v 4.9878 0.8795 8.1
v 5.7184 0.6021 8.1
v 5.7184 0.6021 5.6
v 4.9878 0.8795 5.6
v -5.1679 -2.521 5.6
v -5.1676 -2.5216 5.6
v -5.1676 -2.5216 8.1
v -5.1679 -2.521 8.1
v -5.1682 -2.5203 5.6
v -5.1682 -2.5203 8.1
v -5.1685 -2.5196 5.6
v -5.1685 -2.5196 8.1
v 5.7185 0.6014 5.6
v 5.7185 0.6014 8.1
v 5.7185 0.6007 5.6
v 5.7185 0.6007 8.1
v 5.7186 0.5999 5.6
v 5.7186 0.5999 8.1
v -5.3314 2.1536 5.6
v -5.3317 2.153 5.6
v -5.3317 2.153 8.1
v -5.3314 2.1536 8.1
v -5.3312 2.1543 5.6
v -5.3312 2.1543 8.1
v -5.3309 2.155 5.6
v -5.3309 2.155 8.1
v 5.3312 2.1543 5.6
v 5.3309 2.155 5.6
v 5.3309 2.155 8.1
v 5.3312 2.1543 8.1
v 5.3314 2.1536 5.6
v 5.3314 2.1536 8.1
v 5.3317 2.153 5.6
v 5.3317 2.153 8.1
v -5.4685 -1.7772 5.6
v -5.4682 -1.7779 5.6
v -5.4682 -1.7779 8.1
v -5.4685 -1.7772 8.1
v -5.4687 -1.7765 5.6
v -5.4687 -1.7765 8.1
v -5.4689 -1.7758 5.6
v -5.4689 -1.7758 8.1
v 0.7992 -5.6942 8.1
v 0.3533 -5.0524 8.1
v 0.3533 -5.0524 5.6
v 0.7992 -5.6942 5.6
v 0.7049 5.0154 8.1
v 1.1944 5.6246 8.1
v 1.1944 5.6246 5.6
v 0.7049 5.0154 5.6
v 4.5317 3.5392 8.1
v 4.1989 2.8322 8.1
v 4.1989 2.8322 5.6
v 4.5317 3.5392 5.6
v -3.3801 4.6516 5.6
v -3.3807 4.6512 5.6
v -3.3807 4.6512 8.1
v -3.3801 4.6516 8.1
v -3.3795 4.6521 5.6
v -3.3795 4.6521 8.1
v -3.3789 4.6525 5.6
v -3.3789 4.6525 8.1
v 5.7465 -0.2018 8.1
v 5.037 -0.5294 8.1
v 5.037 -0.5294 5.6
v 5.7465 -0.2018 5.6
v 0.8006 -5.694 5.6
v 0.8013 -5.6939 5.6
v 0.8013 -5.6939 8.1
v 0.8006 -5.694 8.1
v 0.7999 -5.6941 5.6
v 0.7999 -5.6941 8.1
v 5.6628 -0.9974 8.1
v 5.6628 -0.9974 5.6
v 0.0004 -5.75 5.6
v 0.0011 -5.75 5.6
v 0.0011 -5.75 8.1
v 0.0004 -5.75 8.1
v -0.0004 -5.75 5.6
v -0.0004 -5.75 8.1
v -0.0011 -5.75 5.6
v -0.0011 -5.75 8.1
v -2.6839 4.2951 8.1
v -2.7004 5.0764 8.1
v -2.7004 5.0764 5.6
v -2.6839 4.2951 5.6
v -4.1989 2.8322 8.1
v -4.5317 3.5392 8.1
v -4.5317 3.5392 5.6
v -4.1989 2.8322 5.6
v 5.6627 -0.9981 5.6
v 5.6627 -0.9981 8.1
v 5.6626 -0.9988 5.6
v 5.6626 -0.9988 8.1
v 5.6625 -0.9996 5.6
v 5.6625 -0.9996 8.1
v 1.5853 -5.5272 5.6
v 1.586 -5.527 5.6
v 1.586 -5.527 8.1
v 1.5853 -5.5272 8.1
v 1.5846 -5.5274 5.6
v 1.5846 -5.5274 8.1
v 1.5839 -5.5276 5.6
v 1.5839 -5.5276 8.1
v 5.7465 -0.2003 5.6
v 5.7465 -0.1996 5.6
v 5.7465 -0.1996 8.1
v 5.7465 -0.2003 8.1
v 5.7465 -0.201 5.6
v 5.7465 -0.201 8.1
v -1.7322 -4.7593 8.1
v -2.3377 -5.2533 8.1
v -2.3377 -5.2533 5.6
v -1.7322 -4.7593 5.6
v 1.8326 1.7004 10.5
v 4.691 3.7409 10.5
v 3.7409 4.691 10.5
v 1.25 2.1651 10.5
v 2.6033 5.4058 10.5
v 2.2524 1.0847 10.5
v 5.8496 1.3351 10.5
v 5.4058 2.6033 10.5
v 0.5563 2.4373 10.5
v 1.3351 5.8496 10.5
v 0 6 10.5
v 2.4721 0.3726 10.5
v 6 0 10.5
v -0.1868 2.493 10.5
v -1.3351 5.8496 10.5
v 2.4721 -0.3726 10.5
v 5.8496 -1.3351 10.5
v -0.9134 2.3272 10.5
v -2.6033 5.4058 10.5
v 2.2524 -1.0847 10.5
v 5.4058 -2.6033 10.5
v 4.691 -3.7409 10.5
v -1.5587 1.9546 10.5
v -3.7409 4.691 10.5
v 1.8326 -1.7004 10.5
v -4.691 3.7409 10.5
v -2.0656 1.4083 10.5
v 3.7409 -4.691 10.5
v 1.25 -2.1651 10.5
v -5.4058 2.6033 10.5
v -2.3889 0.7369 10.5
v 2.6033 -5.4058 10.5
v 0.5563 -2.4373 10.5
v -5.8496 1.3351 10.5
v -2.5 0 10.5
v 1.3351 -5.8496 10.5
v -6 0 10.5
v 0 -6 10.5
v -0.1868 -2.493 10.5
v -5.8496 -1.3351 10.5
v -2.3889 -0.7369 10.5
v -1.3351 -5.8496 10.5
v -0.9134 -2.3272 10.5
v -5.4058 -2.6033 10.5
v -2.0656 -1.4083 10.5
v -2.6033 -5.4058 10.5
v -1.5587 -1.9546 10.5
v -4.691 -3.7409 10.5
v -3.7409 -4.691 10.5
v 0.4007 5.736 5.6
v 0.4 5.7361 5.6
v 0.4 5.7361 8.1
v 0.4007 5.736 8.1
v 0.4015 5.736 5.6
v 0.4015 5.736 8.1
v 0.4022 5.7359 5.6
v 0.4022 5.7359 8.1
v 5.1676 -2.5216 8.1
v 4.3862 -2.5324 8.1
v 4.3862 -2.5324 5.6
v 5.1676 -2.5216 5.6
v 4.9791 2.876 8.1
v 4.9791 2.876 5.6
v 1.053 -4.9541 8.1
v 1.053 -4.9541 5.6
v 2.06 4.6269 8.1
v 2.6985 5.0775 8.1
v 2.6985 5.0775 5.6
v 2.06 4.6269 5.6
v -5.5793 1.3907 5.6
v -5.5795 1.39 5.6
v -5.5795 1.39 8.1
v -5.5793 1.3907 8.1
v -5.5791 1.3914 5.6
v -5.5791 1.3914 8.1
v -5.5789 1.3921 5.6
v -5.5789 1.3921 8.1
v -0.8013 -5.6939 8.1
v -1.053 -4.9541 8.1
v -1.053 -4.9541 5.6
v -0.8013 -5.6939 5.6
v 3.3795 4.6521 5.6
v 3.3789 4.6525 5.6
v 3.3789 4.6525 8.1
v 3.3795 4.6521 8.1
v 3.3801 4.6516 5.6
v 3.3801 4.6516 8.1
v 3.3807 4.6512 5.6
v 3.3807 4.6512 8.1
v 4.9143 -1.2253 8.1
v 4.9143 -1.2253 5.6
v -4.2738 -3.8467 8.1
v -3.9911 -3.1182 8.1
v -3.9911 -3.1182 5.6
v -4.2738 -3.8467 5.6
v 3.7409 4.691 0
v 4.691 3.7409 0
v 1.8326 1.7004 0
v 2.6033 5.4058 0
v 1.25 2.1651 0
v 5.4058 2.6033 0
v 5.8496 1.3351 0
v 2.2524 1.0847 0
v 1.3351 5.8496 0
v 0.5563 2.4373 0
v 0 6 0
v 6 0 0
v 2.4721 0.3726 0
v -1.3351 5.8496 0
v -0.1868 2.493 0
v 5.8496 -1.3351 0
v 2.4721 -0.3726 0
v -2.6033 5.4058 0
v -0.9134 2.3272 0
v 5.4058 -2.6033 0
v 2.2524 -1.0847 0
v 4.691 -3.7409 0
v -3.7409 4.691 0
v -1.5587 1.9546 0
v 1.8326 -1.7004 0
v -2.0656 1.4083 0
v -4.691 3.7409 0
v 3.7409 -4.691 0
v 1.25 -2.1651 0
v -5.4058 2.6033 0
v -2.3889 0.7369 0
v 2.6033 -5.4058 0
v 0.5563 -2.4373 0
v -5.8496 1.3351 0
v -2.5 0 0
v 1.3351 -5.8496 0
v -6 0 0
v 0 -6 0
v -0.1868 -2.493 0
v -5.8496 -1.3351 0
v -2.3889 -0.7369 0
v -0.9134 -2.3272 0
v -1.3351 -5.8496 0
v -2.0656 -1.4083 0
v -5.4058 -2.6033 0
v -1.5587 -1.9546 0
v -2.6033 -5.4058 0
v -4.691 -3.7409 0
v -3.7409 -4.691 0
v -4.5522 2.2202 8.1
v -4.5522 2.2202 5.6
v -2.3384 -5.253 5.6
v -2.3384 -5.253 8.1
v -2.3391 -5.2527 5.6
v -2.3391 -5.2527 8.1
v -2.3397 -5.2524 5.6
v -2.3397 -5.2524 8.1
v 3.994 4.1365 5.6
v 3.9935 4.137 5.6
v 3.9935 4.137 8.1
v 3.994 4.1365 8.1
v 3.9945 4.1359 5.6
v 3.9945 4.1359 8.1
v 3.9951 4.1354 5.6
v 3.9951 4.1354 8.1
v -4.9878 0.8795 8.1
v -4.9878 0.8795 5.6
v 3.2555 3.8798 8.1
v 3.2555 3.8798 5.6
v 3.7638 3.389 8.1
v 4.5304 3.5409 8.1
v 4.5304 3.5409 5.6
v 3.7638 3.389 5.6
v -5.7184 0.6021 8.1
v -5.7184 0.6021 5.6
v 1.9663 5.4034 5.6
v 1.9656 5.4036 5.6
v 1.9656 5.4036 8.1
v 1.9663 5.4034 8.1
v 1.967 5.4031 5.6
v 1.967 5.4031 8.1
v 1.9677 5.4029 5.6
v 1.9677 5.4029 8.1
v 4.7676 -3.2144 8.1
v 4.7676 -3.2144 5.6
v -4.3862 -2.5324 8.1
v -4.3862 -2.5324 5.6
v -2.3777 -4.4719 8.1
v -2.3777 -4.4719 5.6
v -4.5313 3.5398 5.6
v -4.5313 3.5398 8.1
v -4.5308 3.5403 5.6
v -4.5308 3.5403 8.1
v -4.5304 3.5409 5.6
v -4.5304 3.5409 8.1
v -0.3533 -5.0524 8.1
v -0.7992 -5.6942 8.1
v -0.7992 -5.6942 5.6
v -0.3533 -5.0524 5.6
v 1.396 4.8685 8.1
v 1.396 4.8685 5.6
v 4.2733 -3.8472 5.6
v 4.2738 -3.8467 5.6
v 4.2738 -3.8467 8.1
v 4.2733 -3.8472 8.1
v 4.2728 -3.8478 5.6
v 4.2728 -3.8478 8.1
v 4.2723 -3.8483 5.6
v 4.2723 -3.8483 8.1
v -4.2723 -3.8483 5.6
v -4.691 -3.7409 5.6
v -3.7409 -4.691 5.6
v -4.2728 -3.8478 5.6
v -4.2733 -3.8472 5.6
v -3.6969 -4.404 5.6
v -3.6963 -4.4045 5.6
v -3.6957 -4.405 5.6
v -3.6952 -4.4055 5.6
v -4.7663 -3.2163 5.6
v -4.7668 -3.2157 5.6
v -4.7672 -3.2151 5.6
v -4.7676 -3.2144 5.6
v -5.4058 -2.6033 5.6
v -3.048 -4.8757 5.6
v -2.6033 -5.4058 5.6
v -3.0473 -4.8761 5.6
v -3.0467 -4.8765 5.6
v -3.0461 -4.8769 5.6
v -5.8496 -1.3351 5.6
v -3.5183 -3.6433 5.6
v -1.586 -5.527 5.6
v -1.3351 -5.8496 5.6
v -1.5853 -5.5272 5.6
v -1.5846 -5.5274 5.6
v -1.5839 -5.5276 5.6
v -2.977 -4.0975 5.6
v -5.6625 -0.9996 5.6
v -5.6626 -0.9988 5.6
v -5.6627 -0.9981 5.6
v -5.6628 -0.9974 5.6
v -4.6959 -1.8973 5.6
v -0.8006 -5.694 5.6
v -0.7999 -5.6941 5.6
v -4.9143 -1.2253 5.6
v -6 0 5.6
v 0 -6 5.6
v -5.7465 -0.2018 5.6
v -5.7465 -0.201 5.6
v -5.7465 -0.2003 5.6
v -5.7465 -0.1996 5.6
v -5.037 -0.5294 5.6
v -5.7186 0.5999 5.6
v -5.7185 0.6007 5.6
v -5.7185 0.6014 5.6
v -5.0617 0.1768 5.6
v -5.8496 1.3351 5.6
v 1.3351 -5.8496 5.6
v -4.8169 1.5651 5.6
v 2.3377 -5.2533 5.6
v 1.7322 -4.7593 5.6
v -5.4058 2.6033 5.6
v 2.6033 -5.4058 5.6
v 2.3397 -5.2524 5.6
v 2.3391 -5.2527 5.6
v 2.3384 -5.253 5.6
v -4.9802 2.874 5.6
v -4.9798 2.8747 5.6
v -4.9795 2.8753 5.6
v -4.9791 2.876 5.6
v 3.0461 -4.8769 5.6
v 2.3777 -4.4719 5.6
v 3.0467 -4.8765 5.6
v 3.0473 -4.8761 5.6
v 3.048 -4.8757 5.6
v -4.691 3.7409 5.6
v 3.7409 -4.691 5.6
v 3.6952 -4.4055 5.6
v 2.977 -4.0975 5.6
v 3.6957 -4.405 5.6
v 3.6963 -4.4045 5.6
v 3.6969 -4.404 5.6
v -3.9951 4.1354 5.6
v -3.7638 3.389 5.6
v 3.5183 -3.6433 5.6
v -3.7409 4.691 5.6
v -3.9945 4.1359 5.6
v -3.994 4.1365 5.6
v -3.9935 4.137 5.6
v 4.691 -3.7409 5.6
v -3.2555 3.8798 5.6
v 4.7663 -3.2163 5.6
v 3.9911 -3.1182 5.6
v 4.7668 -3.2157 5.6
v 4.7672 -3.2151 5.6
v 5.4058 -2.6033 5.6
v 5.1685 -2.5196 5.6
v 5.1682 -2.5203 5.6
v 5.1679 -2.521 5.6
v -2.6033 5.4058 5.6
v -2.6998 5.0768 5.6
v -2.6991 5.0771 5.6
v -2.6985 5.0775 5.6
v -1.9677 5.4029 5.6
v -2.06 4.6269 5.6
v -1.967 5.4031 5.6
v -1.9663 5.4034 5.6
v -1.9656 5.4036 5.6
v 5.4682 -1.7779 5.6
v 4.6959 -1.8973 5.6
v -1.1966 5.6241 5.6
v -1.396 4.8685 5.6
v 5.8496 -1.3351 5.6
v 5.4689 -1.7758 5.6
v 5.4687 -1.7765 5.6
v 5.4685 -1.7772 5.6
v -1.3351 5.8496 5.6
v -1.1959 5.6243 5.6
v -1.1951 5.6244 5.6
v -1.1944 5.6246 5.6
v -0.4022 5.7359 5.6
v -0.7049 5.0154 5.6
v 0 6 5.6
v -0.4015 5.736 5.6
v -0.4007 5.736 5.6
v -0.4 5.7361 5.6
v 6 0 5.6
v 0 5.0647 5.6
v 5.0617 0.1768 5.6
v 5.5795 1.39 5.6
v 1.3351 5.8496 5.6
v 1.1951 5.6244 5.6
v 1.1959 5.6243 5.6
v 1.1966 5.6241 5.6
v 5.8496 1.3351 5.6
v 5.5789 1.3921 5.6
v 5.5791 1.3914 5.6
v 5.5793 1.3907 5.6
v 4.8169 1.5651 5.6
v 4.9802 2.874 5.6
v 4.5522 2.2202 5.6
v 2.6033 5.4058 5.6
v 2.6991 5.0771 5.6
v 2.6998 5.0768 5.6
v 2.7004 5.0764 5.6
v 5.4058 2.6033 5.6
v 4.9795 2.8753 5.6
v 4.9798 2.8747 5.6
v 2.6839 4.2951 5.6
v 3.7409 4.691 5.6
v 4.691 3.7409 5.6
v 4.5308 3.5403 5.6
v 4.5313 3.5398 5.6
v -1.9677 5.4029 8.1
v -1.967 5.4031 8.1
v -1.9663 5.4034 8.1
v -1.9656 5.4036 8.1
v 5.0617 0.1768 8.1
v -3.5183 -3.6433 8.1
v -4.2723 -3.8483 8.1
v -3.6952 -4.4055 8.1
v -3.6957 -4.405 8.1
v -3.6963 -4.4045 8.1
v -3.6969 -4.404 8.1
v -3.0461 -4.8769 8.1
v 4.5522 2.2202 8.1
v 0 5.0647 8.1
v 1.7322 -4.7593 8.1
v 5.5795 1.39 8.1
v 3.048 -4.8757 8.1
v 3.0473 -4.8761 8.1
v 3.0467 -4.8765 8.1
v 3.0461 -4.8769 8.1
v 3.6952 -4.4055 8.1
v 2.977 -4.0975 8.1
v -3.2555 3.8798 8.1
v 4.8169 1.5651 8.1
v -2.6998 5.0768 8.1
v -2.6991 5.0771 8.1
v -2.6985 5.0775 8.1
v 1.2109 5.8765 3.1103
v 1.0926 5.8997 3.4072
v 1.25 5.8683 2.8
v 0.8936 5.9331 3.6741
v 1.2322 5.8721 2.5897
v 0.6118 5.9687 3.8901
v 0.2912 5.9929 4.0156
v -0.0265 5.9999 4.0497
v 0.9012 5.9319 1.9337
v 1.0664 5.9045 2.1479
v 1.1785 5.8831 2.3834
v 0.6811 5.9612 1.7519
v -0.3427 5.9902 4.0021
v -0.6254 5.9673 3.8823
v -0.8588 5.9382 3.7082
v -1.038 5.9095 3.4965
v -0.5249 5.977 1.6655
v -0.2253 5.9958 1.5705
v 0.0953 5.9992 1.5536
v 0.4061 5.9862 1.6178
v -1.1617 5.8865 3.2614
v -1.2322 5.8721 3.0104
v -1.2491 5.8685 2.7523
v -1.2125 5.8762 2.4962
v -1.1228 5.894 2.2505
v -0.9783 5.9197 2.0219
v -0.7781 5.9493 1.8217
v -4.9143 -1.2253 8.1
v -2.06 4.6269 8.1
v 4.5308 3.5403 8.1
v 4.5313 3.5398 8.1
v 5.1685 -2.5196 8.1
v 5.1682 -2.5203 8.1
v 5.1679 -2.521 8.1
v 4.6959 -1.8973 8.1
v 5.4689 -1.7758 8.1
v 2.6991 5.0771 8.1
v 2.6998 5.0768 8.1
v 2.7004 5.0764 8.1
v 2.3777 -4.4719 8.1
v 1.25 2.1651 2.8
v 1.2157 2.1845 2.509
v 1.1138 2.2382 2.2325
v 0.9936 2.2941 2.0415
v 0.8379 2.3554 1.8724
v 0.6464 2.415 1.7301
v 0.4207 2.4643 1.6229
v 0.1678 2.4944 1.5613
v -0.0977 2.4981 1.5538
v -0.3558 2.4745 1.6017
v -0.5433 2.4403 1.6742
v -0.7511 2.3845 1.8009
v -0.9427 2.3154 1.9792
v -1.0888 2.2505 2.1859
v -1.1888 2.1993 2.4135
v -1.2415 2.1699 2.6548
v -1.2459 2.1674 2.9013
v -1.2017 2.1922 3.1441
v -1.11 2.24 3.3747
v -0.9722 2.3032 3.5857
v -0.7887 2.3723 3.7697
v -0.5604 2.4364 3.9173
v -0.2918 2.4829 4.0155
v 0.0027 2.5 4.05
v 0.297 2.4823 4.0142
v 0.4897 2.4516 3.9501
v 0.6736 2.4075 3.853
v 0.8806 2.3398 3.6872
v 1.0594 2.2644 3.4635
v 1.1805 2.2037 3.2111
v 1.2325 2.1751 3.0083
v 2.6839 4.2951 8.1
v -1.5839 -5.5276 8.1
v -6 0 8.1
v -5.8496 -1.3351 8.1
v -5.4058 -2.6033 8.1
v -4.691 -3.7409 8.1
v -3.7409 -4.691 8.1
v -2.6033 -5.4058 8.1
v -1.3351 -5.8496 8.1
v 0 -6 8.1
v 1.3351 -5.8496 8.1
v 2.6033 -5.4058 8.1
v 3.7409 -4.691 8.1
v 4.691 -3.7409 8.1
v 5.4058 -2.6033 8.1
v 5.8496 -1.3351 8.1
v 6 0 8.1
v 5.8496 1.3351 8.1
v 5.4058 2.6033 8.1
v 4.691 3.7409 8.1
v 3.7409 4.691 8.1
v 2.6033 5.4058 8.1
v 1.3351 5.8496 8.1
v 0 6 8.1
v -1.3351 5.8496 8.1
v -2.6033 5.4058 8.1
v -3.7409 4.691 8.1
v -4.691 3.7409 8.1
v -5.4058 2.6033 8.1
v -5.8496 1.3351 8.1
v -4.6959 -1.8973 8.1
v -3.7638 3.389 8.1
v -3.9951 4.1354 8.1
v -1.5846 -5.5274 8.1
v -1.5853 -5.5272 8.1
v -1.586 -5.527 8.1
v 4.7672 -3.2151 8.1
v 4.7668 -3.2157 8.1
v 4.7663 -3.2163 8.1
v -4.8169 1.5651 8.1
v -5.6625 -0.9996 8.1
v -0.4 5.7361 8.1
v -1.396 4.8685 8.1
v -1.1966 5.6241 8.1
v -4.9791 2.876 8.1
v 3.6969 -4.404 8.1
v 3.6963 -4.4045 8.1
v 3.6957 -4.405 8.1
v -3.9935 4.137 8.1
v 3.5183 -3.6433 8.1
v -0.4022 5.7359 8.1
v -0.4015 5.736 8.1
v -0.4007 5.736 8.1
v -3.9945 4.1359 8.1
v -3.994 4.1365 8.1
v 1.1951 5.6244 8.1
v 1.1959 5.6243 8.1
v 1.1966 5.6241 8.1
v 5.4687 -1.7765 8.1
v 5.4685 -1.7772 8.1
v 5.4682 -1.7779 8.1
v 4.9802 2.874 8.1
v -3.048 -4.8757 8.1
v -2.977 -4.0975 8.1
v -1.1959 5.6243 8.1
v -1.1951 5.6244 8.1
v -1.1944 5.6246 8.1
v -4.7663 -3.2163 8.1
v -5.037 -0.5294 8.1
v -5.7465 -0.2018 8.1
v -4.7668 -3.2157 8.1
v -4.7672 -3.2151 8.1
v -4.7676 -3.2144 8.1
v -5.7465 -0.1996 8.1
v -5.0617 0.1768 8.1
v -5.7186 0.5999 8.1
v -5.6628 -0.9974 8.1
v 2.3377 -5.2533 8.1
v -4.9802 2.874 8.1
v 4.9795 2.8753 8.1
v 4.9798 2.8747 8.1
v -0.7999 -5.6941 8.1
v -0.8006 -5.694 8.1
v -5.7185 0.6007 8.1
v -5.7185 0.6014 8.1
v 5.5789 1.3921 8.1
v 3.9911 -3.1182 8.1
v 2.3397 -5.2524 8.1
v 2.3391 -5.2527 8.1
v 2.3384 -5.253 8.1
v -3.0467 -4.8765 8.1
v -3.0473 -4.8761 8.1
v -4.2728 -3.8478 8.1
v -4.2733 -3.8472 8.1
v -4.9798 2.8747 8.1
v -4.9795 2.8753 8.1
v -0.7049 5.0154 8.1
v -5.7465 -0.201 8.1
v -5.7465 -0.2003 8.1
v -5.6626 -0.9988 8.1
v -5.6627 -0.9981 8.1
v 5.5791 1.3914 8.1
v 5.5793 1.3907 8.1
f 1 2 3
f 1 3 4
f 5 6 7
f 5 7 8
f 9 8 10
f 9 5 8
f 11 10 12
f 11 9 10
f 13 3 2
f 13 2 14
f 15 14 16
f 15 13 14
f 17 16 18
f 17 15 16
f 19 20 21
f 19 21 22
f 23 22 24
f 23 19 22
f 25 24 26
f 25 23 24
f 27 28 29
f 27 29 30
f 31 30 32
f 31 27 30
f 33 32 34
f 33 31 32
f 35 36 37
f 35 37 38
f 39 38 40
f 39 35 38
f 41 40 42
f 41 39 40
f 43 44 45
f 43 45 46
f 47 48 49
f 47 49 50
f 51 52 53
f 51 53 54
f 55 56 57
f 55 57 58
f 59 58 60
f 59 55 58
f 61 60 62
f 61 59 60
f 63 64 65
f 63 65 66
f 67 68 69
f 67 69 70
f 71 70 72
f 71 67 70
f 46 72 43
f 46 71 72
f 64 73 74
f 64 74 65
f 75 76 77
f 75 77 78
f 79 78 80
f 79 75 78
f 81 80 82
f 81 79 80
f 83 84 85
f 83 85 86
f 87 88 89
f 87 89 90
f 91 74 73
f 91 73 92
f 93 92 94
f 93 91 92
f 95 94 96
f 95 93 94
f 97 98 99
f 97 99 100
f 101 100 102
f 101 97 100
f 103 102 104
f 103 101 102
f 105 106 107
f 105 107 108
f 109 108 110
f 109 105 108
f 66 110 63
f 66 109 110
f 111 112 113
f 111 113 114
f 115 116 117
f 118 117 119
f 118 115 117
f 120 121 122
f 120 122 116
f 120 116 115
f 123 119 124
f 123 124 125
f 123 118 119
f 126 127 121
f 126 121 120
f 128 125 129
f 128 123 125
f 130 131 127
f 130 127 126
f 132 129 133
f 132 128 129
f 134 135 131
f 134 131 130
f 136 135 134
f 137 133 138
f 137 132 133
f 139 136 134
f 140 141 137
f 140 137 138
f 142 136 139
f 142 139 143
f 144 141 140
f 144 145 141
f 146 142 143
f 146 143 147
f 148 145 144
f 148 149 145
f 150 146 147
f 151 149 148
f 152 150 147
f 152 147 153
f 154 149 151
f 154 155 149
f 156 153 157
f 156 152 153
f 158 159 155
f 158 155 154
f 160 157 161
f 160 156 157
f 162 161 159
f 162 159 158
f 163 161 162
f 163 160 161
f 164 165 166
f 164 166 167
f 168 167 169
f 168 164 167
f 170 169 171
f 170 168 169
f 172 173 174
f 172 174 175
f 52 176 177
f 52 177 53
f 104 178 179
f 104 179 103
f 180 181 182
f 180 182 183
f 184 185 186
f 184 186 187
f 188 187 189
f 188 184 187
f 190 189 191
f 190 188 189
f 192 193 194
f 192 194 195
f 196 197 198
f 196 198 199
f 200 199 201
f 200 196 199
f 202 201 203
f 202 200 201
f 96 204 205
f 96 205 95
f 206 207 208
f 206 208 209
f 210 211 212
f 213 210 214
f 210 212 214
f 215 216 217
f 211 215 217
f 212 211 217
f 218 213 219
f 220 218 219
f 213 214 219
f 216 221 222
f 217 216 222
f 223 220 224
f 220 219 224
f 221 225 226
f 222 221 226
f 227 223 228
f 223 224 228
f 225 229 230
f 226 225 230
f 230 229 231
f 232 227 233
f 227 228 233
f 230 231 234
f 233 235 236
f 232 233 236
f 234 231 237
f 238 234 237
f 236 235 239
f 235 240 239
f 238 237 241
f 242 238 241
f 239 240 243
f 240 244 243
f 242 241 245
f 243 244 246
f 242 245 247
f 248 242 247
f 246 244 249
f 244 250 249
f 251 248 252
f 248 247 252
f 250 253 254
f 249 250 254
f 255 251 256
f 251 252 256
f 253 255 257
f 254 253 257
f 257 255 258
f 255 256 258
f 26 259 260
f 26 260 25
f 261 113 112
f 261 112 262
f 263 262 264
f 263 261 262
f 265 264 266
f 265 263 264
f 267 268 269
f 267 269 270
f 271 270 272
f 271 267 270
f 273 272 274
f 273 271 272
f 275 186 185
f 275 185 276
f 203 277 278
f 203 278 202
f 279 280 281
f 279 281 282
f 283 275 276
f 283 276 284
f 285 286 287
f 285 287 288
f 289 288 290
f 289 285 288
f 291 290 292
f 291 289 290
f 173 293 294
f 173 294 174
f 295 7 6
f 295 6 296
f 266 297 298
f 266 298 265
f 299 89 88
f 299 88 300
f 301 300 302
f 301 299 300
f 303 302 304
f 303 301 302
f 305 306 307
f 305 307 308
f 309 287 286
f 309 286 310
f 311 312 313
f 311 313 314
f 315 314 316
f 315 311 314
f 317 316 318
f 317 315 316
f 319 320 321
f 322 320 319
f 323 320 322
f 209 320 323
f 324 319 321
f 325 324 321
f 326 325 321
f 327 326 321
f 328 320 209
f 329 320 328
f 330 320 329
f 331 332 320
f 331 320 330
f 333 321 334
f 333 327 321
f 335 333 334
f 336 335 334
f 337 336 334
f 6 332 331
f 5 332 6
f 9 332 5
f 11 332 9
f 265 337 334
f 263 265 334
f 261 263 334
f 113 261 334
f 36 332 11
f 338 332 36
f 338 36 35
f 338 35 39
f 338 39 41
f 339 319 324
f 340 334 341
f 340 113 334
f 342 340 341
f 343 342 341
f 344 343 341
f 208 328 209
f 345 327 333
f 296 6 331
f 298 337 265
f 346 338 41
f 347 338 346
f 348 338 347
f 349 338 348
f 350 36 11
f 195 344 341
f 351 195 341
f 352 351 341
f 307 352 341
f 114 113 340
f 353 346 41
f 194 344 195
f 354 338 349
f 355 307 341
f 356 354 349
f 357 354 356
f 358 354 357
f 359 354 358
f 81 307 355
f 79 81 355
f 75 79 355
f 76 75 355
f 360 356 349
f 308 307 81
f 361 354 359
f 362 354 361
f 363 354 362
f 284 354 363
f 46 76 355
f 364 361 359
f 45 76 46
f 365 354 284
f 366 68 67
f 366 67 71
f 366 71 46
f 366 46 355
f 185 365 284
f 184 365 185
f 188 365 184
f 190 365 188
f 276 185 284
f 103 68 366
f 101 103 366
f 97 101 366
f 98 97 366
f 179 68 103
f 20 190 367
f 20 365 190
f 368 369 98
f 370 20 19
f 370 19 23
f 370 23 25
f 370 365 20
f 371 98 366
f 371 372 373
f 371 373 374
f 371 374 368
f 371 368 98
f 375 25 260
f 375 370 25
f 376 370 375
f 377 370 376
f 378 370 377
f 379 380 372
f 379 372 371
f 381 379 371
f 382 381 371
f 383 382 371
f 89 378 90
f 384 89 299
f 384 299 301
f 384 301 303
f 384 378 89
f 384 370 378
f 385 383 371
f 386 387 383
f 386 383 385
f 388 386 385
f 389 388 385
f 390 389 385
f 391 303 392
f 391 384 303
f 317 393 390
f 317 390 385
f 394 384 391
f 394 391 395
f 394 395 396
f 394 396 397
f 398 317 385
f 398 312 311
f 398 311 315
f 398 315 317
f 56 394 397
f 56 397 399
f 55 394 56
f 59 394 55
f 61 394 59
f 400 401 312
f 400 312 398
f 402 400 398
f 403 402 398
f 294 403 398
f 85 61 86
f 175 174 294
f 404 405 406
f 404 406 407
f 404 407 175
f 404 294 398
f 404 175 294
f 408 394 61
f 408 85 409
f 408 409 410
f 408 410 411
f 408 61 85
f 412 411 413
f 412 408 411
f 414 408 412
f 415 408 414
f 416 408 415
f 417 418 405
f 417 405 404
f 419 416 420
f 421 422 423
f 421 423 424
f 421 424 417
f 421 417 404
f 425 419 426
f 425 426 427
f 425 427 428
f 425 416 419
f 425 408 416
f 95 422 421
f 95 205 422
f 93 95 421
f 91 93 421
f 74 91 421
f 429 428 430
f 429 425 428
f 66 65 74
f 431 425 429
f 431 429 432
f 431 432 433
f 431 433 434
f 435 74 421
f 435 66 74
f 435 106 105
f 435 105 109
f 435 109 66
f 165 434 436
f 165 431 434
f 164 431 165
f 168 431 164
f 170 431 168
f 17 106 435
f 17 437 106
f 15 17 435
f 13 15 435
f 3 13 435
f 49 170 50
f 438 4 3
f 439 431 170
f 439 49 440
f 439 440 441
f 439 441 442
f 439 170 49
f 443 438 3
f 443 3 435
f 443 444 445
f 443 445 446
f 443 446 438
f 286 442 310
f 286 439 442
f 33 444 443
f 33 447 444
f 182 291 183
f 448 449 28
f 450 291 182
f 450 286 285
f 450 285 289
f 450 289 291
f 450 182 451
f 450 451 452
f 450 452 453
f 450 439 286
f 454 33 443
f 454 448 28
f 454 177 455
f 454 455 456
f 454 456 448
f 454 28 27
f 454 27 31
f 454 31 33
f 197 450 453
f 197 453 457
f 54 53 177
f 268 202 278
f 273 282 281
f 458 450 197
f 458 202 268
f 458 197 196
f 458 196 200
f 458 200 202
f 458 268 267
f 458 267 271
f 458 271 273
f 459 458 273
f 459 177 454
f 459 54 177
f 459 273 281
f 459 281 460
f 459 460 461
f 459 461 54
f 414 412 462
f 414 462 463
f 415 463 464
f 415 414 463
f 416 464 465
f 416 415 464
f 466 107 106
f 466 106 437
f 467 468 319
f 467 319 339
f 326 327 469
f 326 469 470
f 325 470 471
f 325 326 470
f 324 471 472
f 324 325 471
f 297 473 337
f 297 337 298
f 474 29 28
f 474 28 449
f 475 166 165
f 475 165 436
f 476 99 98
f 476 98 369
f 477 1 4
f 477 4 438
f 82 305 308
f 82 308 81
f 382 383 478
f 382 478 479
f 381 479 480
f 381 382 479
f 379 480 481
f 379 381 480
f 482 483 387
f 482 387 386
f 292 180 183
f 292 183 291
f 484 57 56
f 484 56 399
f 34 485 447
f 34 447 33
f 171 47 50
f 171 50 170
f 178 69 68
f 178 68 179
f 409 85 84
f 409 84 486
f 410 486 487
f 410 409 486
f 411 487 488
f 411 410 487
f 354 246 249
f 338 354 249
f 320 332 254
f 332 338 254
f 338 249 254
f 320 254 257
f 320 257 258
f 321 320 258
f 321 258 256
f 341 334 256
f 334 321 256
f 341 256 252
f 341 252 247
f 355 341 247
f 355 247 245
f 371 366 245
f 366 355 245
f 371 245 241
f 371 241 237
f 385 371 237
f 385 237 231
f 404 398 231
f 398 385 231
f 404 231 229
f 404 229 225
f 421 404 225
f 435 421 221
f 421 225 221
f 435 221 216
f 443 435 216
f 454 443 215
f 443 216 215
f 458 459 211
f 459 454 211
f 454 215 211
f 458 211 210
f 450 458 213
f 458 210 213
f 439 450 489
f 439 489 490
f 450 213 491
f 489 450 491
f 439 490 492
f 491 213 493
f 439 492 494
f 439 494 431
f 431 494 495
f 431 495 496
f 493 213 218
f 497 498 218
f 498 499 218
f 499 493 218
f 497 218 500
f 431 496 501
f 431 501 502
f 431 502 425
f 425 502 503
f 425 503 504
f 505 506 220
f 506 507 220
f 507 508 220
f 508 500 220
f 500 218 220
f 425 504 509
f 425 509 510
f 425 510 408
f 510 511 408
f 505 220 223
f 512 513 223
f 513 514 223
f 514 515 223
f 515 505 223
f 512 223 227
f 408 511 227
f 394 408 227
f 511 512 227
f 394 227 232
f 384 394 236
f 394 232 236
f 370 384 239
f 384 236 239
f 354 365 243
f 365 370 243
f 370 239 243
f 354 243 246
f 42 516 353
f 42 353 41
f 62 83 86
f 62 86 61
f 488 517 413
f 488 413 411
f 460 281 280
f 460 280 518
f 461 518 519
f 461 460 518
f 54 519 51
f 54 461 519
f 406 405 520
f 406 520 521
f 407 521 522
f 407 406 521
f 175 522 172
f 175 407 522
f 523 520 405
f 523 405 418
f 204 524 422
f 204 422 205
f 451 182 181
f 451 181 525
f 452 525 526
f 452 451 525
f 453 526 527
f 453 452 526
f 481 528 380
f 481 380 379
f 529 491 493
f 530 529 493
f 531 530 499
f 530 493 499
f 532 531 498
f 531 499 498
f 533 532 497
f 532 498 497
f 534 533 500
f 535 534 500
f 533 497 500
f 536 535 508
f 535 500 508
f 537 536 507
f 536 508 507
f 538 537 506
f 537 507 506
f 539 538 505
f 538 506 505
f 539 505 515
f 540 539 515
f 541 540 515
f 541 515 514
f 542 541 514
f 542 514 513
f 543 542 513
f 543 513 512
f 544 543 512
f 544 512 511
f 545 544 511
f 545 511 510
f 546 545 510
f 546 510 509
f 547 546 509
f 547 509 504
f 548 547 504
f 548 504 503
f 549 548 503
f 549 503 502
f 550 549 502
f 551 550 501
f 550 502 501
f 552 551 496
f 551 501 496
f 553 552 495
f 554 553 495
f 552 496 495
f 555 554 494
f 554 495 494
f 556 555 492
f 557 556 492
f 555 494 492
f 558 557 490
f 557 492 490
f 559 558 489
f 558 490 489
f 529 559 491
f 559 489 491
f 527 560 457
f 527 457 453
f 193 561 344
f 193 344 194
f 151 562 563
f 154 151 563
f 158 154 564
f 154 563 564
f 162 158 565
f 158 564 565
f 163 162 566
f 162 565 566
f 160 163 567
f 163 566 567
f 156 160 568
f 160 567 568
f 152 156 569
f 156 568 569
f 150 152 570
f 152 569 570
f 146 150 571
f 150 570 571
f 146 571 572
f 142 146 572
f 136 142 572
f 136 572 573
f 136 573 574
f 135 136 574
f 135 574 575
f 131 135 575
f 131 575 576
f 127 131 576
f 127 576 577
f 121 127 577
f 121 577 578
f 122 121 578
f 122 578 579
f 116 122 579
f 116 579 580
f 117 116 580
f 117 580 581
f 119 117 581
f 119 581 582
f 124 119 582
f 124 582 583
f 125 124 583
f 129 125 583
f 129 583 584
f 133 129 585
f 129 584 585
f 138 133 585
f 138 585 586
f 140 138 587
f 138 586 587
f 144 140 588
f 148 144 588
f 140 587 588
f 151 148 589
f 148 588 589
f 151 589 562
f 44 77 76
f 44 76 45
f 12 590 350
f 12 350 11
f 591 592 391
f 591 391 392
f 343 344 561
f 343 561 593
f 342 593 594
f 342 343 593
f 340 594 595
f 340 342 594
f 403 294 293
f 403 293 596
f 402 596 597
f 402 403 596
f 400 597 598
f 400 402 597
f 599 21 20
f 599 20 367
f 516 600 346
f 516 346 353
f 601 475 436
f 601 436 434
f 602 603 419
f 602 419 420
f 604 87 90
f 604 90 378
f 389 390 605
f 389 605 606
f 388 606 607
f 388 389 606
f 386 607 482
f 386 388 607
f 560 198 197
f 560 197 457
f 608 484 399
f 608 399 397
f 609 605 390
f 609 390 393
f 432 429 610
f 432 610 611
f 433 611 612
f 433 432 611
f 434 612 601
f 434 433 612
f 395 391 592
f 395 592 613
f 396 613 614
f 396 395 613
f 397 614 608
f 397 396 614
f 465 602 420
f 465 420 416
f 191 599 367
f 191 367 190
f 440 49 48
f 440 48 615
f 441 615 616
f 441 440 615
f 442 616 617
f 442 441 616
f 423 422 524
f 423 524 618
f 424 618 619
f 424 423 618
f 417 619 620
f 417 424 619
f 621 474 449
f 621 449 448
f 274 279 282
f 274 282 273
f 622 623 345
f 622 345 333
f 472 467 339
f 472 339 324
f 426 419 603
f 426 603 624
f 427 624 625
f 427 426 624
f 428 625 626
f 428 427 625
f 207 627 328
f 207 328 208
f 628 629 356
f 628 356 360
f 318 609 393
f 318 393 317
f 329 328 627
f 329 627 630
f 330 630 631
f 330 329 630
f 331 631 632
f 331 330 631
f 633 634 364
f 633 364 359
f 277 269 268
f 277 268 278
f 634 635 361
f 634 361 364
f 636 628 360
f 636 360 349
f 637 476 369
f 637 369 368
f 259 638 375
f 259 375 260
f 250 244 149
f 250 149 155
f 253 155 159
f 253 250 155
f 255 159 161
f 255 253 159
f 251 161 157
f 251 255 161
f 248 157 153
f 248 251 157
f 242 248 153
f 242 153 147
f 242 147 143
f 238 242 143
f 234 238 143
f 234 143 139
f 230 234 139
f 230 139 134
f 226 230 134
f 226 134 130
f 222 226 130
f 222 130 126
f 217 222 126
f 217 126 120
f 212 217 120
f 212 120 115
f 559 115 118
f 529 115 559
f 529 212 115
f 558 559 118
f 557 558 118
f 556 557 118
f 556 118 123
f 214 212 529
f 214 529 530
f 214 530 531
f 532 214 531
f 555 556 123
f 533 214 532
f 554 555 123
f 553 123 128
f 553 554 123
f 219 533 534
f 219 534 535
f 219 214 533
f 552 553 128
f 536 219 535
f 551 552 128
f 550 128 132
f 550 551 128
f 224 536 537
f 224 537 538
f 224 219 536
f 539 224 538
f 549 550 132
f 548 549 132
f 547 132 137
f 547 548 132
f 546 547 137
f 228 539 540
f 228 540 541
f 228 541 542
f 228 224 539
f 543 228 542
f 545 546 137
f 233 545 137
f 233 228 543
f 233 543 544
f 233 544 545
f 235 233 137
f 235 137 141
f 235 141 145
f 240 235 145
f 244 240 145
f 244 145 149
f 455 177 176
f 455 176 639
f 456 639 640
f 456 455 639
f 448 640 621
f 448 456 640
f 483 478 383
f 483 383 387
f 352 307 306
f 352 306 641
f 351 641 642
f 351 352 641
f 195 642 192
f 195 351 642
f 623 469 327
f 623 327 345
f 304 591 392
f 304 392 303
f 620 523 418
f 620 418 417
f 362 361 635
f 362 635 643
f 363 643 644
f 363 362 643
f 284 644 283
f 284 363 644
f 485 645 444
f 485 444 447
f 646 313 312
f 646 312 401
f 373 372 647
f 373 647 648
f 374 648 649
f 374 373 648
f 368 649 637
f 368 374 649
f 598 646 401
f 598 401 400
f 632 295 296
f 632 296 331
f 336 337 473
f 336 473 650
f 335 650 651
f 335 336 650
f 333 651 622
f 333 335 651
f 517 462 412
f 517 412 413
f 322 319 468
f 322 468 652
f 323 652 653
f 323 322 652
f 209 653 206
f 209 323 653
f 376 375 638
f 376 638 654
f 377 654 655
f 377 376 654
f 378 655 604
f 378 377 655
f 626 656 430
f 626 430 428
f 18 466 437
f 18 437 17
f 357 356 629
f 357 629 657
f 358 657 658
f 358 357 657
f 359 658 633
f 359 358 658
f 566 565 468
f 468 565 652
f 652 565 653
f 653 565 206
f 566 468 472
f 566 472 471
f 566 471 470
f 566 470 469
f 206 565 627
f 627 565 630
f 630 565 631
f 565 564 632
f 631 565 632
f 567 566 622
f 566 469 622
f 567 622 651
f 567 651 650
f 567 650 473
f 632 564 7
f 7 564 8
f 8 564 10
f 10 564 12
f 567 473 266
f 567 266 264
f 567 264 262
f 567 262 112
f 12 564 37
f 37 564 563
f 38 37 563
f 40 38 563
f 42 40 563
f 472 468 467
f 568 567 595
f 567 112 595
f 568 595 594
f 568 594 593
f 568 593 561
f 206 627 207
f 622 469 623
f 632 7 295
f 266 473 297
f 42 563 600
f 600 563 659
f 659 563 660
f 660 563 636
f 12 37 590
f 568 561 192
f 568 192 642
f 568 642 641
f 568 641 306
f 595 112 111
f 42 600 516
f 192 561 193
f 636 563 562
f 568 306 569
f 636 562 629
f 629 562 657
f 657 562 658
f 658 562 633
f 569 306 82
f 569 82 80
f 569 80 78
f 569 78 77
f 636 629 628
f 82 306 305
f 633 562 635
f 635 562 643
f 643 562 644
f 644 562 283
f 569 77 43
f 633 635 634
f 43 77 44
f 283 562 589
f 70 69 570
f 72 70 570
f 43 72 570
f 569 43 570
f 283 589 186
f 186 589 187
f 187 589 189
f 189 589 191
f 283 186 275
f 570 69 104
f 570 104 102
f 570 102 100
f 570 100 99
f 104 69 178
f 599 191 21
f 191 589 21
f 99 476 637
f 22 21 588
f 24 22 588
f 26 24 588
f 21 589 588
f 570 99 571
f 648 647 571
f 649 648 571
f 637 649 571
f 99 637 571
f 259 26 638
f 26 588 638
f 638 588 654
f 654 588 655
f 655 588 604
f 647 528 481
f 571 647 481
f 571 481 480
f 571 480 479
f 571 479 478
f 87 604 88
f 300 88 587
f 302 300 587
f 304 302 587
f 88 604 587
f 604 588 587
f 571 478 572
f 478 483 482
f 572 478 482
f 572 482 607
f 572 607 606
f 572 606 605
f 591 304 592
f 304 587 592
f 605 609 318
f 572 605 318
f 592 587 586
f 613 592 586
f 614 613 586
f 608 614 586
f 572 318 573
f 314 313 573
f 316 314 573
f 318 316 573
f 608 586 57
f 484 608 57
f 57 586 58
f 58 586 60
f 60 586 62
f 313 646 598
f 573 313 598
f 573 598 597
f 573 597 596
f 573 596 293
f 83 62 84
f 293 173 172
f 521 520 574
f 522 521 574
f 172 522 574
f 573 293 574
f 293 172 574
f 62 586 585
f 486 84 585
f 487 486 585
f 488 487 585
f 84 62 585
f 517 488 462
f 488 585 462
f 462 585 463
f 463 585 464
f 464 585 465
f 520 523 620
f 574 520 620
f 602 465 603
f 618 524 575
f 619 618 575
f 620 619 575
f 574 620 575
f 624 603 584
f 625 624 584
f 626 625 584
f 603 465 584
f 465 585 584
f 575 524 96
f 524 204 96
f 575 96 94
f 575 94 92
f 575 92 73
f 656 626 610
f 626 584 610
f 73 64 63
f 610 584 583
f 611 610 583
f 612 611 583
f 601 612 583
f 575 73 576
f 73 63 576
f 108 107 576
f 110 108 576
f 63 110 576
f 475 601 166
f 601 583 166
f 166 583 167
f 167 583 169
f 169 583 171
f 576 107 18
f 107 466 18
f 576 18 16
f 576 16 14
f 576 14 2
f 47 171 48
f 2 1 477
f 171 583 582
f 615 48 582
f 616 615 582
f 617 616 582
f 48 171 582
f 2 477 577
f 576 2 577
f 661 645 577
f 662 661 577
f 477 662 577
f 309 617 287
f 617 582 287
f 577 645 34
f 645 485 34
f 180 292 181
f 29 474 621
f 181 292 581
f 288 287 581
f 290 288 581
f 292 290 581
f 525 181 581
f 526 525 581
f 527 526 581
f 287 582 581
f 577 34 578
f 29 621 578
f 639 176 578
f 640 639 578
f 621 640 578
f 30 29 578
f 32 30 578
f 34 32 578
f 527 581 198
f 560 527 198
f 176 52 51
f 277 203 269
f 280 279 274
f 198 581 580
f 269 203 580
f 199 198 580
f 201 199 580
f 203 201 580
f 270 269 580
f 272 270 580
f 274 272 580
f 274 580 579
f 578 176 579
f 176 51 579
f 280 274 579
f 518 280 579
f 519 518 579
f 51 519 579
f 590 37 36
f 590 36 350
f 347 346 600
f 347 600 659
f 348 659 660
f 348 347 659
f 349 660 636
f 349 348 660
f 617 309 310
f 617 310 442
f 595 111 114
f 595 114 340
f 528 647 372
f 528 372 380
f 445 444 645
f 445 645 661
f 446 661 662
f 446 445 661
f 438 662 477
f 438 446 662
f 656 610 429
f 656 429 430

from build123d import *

# Parameters (mm, degrees)
CROQUIS1_R                                     = 6
CROQUIS1_R_2                                   = 2.5
SALIENTE_EXTRUIR1_DEPTH                        = 10.5
CROQUIS2_W                                     = 0.25
CROQUIS2_H                                     = 2.5
CORTAR_EXTRUIR1_DEPTH                          = 2.5
MATRIZC1_COUNT                                 = 45
PERFORADOR_PARA_ROSCAR_PARA_MACHO_DE_ROS_REACH = 19.037
PERFORADOR_PARA_ROSCAR_PARA_MACHO_DE_2_R       = 1.25


with BuildPart() as part:
    # Croquis1 → Saliente-Extruir1 (new body)
    with BuildSketch(Plane.XY):
        with Locations(Location((0, 0, 0), (0, 0, 180))):
            Circle(CROQUIS1_R)
        with Locations(Location((0, 0, 0), (0, 0, 180))):
            Circle(CROQUIS1_R_2, mode=Mode.SUBTRACT)
    extrude(amount=SALIENTE_EXTRUIR1_DEPTH)

    # Croquis2 → Cortar-Revolución1 (revolve, cut)
    with BuildSketch(Plane(origin=(0, 0, 0), x_dir=(1, 0, 0), z_dir=(0, 1, 0)), mode=Mode.PRIVATE) as cortar_revoluci_n1_sk:
        with Locations((5.875, -6.85)):
            Rectangle(CROQUIS2_W, CROQUIS2_H)
    revolve(cortar_revoluci_n1_sk.sketch.rotate(Axis((0, 0, 10.5), (0, 0, -1)), 180), axis=Axis((0, 0, 10.5), (0, 0, -1)), mode=Mode.SUBTRACT)

    # Croquis3 → Cortar-Extruir1 (cut)
    with BuildSketch(Plane(origin=(0, 0, 8.1), x_dir=(-1, 0, 0), z_dir=(0, 0, -1))):
        with BuildLine():
            Line((-0.4, 5.736070083), (0, 5.064736343))
            Line((0, 5.064736343), (0.4, 5.736070083))
            ThreePointArc((0.4, 5.736070083), (0, 5.75), (-0.4, 5.736070083))
        make_face()
    cortar_extruir1 = extrude(amount=CORTAR_EXTRUIR1_DEPTH, mode=Mode.SUBTRACT)

    # MatrizC1: Cortar-Extruir1 ×45 about axis
    matrizc1_axis = Axis((0, 0, 0), (0, 0, 1))
    for i in range(1, MATRIZC1_COUNT):
        add(cortar_extruir1.rotate(matrizc1_axis, i * 360 / MATRIZC1_COUNT), mode=Mode.SUBTRACT)

    # Perforador para roscar para macho de 2 → Perforador para roscar para macho de roscar para M31 (cut, up to next)
    with BuildSketch(Plane(origin=(0, 6, 0), x_dir=(1, 0, 0), z_dir=(0, 1, 0)), mode=Mode.PRIVATE) as perforador_para_roscar_para_macho_de_ros_sk1:
        with Locations((0, -2.8)):
            Circle(PERFORADOR_PARA_ROSCAR_PARA_MACHO_DE_2_R)
    perforador_para_roscar_para_macho_de_ros_tool1 = extrude(perforador_para_roscar_para_macho_de_ros_sk1.sketch, amount=-PERFORADOR_PARA_ROSCAR_PARA_MACHO_DE_ROS_REACH, mode=Mode.PRIVATE) & part.part
    add(perforador_para_roscar_para_macho_de_ros_tool1.solids().sort_by_distance((0, 6, 2.8))[0], mode=Mode.SUBTRACT)


solid = part.part
